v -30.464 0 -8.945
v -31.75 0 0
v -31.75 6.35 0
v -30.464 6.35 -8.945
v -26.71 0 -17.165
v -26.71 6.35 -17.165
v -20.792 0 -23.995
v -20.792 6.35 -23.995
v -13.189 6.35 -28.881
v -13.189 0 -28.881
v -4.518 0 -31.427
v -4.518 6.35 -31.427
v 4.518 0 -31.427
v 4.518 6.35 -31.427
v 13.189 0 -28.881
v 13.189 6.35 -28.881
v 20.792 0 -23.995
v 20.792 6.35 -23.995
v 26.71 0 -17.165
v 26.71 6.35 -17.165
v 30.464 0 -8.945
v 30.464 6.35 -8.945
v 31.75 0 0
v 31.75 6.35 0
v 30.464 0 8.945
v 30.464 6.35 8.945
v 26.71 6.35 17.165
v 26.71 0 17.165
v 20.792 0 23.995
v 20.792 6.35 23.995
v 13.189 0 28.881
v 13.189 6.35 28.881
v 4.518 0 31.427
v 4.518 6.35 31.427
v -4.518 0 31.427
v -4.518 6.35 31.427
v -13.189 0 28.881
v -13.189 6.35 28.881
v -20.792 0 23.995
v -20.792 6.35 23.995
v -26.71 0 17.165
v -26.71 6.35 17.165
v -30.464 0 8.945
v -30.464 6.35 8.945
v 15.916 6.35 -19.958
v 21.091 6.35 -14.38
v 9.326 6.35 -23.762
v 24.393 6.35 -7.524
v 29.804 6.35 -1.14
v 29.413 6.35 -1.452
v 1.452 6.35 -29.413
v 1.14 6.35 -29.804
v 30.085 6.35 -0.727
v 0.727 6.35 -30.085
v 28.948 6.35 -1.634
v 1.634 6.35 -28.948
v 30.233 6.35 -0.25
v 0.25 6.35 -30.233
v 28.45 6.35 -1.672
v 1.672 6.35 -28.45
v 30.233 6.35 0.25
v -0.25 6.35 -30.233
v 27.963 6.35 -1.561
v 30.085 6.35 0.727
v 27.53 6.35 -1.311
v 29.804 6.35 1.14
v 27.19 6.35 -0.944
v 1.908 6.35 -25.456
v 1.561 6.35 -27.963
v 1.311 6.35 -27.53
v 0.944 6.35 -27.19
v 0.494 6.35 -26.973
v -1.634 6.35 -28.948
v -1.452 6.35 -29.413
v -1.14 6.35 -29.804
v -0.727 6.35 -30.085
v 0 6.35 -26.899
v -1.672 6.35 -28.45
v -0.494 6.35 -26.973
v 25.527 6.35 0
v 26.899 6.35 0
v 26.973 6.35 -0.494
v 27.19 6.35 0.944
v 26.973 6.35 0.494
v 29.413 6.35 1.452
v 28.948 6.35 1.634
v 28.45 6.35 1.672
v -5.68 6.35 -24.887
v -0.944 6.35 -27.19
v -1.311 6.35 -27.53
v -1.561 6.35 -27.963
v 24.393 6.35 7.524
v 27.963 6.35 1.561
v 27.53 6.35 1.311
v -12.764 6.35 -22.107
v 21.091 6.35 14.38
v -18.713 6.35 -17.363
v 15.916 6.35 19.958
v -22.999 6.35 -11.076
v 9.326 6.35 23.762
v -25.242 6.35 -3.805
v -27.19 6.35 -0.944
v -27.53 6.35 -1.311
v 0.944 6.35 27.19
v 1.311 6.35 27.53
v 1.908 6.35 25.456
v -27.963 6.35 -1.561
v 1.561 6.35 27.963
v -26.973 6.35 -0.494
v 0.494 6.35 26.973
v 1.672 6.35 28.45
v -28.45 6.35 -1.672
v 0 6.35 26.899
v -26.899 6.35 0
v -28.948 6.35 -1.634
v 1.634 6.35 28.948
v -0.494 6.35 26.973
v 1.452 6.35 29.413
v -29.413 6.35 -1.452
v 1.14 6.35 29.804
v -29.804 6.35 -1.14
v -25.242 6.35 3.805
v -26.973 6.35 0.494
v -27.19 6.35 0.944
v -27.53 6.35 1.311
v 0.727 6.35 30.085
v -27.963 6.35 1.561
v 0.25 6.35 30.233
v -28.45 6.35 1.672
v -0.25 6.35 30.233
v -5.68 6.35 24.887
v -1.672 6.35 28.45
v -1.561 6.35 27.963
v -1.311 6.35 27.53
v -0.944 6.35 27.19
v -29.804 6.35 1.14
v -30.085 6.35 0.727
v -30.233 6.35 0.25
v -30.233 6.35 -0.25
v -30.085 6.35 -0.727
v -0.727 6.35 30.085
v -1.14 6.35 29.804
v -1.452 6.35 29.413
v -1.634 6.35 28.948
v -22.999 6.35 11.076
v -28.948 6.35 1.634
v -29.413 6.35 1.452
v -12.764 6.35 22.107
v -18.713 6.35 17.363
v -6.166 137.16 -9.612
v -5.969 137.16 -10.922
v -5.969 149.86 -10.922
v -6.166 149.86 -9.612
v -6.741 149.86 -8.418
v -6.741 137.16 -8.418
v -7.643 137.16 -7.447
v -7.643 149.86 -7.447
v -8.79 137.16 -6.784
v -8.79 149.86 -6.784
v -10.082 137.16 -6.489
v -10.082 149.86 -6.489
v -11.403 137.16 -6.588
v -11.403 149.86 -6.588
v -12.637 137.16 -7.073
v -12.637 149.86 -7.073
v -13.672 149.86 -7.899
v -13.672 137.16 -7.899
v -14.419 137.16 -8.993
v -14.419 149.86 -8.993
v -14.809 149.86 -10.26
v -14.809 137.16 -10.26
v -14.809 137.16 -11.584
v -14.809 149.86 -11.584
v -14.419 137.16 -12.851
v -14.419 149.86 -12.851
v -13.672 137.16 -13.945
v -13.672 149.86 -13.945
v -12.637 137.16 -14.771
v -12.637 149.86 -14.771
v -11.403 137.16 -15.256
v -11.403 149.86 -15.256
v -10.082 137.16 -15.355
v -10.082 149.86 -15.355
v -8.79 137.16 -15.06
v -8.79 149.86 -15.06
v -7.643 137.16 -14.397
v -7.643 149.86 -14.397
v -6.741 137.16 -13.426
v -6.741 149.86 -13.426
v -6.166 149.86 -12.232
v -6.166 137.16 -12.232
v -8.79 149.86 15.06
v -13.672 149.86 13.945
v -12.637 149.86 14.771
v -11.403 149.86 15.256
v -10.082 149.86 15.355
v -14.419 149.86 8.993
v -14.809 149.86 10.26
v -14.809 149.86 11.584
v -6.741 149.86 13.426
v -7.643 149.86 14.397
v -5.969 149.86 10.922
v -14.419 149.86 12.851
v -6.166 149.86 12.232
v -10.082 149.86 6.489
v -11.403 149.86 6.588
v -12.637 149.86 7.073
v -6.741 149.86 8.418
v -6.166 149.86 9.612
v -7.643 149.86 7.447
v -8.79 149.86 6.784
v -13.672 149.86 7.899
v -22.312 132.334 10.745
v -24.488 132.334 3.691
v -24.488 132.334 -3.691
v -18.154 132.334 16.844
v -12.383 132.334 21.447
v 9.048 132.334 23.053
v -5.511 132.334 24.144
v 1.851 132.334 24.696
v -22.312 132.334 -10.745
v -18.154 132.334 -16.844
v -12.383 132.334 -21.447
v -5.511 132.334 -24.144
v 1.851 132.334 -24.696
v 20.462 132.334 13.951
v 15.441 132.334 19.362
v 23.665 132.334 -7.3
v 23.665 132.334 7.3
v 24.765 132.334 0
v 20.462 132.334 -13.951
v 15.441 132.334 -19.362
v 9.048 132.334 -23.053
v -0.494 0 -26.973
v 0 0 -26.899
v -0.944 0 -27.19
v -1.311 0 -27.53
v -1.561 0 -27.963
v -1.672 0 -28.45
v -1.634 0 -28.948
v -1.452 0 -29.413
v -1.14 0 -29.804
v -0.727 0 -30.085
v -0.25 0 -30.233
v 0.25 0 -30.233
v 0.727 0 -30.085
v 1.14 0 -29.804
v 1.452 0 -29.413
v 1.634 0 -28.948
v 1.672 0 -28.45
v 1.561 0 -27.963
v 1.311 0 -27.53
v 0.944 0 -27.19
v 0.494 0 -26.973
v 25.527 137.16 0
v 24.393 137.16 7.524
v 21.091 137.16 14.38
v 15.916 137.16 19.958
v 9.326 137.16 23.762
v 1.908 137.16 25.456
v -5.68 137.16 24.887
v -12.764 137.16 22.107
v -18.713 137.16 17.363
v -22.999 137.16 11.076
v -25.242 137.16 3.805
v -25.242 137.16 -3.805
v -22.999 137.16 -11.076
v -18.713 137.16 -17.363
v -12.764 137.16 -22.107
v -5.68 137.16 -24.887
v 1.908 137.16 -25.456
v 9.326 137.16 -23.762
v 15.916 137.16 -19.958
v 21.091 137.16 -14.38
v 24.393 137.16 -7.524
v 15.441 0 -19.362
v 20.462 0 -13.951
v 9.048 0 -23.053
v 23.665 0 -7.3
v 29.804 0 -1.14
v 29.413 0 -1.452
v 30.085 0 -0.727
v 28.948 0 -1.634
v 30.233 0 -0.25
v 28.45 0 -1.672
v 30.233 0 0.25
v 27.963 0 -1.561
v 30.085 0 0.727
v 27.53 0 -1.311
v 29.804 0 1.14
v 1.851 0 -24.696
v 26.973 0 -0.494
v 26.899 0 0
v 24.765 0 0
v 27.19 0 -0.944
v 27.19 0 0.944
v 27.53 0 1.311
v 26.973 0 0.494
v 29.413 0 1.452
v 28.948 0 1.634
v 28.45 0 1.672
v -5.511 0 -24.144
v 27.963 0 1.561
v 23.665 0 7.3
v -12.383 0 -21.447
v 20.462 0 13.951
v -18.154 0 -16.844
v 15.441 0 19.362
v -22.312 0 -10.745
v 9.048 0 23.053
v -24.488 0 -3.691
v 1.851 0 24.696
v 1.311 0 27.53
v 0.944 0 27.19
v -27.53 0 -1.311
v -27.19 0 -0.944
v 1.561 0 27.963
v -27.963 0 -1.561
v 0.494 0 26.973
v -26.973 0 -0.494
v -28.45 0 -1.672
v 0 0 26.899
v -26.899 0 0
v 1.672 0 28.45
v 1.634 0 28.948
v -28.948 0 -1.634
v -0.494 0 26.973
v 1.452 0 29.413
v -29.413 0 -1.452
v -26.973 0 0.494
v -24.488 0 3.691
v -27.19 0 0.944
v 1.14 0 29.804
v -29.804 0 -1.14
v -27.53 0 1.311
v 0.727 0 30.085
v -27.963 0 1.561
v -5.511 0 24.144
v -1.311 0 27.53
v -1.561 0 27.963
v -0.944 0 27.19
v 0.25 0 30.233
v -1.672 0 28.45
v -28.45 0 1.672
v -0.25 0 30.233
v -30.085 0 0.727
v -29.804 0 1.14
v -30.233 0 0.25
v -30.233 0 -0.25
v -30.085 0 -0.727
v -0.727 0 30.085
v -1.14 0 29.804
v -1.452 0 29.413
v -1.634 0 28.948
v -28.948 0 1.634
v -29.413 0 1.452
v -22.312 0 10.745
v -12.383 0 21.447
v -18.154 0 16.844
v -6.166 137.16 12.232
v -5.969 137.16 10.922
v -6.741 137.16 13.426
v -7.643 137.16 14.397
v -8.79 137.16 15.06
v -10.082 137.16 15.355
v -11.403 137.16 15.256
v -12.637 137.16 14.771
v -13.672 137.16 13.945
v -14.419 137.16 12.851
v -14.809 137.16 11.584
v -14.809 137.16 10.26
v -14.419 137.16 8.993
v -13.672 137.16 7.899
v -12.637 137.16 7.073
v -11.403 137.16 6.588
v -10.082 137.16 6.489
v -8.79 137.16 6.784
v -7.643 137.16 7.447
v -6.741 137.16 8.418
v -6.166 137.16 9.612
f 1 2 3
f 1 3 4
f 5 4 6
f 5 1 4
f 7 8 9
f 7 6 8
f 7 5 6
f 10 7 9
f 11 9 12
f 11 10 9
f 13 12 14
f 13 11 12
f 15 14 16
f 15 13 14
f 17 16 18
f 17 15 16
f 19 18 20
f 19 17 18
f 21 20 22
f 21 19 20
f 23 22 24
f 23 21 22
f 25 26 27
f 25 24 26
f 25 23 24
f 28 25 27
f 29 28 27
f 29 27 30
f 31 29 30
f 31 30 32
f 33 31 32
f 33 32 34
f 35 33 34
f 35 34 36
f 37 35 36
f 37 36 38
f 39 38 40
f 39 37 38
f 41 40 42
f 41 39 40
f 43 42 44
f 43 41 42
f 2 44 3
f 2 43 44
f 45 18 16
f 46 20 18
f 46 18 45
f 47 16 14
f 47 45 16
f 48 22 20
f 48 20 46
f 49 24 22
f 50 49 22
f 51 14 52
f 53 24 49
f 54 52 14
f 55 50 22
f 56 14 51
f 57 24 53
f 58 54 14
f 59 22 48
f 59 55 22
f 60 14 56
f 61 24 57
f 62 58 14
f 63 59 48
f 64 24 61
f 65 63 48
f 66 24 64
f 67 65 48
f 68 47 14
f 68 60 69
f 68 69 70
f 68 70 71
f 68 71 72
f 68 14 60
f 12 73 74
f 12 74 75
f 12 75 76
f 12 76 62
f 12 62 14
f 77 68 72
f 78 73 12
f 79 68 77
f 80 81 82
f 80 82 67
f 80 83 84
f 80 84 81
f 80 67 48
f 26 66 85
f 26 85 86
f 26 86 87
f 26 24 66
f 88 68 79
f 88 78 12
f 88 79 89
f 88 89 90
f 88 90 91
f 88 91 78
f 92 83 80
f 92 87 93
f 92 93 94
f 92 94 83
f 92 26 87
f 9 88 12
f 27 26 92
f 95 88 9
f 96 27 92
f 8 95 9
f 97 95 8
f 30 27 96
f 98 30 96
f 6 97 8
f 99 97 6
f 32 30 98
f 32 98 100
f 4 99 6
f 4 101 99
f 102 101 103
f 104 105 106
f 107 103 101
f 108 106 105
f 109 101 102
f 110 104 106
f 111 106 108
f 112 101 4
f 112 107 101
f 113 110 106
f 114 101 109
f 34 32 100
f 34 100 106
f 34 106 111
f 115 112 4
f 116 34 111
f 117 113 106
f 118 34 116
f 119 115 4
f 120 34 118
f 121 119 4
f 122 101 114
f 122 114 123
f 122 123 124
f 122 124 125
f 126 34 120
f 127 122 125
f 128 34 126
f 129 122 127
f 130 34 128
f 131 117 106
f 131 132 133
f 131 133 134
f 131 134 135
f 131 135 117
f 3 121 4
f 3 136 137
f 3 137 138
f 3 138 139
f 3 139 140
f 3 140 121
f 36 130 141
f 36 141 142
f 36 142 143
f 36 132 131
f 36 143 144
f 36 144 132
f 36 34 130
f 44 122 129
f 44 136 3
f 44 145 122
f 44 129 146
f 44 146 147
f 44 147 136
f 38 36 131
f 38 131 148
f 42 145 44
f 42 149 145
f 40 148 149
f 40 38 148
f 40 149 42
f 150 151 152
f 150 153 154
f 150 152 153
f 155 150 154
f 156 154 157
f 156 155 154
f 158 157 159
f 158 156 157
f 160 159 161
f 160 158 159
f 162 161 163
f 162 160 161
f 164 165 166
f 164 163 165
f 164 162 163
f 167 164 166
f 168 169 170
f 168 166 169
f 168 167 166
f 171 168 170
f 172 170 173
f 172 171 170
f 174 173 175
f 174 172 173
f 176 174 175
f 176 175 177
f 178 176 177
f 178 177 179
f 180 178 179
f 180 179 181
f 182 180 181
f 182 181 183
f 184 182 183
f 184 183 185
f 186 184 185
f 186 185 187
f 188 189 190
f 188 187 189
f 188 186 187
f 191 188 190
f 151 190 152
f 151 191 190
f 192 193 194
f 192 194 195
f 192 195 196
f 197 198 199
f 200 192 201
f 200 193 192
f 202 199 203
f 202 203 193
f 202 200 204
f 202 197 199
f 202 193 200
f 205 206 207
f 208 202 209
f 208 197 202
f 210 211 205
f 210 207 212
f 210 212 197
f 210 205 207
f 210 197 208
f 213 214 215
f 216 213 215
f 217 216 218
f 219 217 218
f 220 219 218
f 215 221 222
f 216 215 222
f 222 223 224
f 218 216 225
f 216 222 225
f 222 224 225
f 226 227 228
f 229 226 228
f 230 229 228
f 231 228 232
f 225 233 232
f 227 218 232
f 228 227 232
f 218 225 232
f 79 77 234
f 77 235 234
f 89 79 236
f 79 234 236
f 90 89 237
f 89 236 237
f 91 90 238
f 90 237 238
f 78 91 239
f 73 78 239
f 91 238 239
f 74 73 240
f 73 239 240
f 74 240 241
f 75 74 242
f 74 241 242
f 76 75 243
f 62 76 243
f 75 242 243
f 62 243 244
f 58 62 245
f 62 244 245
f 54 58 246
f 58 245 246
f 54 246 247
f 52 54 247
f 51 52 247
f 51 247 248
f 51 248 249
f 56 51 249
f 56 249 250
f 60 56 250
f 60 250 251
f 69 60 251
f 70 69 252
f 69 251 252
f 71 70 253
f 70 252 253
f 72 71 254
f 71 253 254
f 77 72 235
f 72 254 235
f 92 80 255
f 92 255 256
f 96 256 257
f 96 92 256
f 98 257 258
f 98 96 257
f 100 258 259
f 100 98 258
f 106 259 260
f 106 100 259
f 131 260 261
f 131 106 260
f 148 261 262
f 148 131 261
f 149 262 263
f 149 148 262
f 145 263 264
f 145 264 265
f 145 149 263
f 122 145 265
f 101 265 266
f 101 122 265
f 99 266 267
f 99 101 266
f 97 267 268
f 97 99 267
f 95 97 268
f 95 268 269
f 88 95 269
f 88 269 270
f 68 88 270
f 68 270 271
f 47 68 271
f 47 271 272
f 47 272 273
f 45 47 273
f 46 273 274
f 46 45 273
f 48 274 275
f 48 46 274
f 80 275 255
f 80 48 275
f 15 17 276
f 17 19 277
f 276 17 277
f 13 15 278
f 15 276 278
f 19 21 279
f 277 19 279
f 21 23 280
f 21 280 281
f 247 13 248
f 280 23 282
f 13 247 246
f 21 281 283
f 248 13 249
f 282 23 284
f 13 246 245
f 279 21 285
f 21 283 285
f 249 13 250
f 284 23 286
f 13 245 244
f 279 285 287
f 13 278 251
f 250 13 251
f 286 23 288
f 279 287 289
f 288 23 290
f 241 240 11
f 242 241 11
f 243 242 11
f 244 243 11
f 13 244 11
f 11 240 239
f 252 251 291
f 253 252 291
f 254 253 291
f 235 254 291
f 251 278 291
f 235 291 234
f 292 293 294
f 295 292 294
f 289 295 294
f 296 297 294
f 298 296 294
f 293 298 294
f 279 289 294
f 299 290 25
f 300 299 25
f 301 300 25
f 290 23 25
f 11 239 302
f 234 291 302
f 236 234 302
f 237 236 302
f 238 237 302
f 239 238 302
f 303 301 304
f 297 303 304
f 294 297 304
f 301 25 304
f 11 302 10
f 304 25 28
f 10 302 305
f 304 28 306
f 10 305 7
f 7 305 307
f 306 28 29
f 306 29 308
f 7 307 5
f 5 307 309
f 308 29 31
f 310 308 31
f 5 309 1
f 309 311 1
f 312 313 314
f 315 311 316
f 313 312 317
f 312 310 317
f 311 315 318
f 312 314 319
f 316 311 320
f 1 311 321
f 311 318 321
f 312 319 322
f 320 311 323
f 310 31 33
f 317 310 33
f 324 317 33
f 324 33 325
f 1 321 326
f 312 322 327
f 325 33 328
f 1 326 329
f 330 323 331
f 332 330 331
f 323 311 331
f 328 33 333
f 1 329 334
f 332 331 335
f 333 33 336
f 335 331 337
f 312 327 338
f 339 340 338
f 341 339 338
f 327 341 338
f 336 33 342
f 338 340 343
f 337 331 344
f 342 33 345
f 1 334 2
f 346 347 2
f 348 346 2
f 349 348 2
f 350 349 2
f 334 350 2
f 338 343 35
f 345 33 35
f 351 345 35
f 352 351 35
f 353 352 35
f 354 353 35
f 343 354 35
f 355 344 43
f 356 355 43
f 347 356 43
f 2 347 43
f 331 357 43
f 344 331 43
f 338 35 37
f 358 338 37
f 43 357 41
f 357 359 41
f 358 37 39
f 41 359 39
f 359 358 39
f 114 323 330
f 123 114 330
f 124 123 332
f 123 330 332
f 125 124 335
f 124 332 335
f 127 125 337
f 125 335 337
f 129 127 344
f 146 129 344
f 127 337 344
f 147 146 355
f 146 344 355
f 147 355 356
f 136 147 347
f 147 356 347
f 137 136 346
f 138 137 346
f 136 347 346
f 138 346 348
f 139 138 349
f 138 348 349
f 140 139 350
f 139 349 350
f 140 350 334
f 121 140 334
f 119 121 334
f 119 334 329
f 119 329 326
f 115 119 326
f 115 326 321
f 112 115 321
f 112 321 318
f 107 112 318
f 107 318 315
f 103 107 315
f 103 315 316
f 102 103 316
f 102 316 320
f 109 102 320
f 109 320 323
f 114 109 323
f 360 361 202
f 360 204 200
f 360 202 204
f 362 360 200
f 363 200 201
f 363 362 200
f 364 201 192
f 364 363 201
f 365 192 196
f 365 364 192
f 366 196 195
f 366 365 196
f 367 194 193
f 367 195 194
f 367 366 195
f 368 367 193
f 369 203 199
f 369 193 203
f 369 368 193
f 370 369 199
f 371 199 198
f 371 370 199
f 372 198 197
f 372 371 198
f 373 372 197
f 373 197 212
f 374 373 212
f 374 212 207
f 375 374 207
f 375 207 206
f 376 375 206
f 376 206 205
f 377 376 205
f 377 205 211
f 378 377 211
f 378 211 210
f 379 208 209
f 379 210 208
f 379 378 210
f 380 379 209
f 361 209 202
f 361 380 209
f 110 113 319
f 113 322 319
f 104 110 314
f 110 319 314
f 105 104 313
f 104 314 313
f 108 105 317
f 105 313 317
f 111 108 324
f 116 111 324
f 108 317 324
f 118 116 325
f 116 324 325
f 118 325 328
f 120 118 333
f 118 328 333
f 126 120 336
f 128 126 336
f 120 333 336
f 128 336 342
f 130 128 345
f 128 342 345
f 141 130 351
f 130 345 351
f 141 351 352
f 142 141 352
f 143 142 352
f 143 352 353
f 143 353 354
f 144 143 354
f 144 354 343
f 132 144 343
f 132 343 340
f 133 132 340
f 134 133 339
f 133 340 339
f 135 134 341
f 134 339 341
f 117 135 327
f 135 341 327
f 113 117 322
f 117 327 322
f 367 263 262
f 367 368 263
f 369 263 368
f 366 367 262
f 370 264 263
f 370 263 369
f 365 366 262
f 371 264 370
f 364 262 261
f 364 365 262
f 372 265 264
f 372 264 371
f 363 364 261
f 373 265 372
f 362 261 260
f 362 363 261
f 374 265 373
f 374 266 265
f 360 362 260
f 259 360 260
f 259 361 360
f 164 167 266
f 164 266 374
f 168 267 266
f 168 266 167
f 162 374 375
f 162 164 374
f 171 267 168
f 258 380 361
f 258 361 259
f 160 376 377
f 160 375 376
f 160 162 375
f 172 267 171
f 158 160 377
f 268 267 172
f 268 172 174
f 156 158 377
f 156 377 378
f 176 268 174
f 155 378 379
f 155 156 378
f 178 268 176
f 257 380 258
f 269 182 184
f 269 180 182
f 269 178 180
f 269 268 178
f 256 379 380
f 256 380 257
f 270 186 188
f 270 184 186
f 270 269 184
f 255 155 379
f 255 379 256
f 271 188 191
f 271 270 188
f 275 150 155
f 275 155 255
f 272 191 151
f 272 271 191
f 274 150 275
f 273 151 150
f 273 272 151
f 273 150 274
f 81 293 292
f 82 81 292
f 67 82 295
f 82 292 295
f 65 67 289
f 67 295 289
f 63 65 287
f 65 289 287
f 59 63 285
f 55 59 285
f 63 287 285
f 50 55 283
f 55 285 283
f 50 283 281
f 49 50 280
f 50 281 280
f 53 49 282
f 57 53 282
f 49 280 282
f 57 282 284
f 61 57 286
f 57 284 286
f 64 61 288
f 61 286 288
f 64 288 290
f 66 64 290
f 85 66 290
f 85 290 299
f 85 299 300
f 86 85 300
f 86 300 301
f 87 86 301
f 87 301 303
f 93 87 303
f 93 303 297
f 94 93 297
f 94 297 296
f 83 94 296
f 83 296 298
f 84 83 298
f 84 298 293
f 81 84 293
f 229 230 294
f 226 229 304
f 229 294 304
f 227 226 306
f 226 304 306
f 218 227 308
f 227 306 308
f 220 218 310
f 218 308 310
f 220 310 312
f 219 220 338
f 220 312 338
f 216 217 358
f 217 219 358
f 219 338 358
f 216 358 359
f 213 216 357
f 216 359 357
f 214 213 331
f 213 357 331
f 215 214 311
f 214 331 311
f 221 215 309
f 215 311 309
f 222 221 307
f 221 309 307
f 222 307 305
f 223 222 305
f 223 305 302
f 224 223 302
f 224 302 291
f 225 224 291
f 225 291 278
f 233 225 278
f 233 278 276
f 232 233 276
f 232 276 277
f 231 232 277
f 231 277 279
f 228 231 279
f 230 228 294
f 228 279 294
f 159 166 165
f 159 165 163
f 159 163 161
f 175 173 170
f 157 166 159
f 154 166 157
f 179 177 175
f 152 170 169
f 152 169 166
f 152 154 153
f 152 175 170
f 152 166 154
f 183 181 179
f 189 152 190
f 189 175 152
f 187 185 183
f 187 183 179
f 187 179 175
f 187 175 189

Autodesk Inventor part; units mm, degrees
ref_plane "YZ Plane" through (0, 0, 0) normal (1, 0, 0) x (0, 1, 0)
ref_plane "XZ Plane" through (0, 0, 0) normal (0, 1, 0) x (-1, 0, 0)
ref_plane "XY Plane" through (0, 0, 0) normal (0, 0, 1) x (1, 0, 0)
sketch "Sketch1" plane through (0, 0, 0) normal (0, 1, 0) x (-1, 0, 0)
  circle A0 centre (0, 0) radius 31.75
  circle A1 centre (0, 0) radius 25.527
  dimension "d0" = 63.5
  dimension "d1" = 6.223
extrude "Extrusion1" add sketch "Sketch1" along normal blind 6.35
sketch "Sketch2" plane through (0, 6.35, 0) normal (0, 1, 0) x (1, 0, 0)
  circle A0 centre (0, 0) radius 25.527 projected
  circle A1 centre (0, 28.575) radius 1.535
  dimension "d4" = 28.575
hole "Hole1" at (0, 6.35, -28.575) direction (0, -1, 0) diameter 3.3528 depth 25.4 tip angle 118
pattern_circular "Circular Pattern1" count 4 over 360 about axis through (0, 0, 0) along (0, 1, 0) of "Hole1"
sketch "Sketch4" plane through (0, 0, 0) normal (0, -1, 0) x (1, 0, 0)
  circle A0 centre (0, 0) radius 25.527 projected
  circle A1 centre (0, 0) radius 24.765
  dimension "d16" = 0.762
extrude "Extrusion2" add sketch "Sketch4" against normal blind 137.16
sketch "Sketch5" plane through (0, 137.16, 0) normal (0, 1, 0) x (1, 0, 0)
  circle A0 centre (0, 0) radius 24.765 projected
extrude "Extrusion3" add sketch "Sketch5" against normal blind 4.826
sketch "Sketch6" plane through (0, 137.16, 0) normal (0, 1, 0) x (1, 0, 0)
  circle A0 centre (0, 0) radius 25.527 projected
  circle A1 centre (-10.414, 10.922) radius 4.445
  line L0 (0, 0) -> (-12.3032, 0) construction
  circle A2 centre (-10.414, -10.922) radius 4.445
  dimension "d21" = 10.414
  dimension "d22" = 10.922
  dimension "d23" = 8.89
extrude "Extrusion4" add sketch "Sketch6" along normal blind 12.7 contours A1 | A2
properties part number "balun" material "Copper"
